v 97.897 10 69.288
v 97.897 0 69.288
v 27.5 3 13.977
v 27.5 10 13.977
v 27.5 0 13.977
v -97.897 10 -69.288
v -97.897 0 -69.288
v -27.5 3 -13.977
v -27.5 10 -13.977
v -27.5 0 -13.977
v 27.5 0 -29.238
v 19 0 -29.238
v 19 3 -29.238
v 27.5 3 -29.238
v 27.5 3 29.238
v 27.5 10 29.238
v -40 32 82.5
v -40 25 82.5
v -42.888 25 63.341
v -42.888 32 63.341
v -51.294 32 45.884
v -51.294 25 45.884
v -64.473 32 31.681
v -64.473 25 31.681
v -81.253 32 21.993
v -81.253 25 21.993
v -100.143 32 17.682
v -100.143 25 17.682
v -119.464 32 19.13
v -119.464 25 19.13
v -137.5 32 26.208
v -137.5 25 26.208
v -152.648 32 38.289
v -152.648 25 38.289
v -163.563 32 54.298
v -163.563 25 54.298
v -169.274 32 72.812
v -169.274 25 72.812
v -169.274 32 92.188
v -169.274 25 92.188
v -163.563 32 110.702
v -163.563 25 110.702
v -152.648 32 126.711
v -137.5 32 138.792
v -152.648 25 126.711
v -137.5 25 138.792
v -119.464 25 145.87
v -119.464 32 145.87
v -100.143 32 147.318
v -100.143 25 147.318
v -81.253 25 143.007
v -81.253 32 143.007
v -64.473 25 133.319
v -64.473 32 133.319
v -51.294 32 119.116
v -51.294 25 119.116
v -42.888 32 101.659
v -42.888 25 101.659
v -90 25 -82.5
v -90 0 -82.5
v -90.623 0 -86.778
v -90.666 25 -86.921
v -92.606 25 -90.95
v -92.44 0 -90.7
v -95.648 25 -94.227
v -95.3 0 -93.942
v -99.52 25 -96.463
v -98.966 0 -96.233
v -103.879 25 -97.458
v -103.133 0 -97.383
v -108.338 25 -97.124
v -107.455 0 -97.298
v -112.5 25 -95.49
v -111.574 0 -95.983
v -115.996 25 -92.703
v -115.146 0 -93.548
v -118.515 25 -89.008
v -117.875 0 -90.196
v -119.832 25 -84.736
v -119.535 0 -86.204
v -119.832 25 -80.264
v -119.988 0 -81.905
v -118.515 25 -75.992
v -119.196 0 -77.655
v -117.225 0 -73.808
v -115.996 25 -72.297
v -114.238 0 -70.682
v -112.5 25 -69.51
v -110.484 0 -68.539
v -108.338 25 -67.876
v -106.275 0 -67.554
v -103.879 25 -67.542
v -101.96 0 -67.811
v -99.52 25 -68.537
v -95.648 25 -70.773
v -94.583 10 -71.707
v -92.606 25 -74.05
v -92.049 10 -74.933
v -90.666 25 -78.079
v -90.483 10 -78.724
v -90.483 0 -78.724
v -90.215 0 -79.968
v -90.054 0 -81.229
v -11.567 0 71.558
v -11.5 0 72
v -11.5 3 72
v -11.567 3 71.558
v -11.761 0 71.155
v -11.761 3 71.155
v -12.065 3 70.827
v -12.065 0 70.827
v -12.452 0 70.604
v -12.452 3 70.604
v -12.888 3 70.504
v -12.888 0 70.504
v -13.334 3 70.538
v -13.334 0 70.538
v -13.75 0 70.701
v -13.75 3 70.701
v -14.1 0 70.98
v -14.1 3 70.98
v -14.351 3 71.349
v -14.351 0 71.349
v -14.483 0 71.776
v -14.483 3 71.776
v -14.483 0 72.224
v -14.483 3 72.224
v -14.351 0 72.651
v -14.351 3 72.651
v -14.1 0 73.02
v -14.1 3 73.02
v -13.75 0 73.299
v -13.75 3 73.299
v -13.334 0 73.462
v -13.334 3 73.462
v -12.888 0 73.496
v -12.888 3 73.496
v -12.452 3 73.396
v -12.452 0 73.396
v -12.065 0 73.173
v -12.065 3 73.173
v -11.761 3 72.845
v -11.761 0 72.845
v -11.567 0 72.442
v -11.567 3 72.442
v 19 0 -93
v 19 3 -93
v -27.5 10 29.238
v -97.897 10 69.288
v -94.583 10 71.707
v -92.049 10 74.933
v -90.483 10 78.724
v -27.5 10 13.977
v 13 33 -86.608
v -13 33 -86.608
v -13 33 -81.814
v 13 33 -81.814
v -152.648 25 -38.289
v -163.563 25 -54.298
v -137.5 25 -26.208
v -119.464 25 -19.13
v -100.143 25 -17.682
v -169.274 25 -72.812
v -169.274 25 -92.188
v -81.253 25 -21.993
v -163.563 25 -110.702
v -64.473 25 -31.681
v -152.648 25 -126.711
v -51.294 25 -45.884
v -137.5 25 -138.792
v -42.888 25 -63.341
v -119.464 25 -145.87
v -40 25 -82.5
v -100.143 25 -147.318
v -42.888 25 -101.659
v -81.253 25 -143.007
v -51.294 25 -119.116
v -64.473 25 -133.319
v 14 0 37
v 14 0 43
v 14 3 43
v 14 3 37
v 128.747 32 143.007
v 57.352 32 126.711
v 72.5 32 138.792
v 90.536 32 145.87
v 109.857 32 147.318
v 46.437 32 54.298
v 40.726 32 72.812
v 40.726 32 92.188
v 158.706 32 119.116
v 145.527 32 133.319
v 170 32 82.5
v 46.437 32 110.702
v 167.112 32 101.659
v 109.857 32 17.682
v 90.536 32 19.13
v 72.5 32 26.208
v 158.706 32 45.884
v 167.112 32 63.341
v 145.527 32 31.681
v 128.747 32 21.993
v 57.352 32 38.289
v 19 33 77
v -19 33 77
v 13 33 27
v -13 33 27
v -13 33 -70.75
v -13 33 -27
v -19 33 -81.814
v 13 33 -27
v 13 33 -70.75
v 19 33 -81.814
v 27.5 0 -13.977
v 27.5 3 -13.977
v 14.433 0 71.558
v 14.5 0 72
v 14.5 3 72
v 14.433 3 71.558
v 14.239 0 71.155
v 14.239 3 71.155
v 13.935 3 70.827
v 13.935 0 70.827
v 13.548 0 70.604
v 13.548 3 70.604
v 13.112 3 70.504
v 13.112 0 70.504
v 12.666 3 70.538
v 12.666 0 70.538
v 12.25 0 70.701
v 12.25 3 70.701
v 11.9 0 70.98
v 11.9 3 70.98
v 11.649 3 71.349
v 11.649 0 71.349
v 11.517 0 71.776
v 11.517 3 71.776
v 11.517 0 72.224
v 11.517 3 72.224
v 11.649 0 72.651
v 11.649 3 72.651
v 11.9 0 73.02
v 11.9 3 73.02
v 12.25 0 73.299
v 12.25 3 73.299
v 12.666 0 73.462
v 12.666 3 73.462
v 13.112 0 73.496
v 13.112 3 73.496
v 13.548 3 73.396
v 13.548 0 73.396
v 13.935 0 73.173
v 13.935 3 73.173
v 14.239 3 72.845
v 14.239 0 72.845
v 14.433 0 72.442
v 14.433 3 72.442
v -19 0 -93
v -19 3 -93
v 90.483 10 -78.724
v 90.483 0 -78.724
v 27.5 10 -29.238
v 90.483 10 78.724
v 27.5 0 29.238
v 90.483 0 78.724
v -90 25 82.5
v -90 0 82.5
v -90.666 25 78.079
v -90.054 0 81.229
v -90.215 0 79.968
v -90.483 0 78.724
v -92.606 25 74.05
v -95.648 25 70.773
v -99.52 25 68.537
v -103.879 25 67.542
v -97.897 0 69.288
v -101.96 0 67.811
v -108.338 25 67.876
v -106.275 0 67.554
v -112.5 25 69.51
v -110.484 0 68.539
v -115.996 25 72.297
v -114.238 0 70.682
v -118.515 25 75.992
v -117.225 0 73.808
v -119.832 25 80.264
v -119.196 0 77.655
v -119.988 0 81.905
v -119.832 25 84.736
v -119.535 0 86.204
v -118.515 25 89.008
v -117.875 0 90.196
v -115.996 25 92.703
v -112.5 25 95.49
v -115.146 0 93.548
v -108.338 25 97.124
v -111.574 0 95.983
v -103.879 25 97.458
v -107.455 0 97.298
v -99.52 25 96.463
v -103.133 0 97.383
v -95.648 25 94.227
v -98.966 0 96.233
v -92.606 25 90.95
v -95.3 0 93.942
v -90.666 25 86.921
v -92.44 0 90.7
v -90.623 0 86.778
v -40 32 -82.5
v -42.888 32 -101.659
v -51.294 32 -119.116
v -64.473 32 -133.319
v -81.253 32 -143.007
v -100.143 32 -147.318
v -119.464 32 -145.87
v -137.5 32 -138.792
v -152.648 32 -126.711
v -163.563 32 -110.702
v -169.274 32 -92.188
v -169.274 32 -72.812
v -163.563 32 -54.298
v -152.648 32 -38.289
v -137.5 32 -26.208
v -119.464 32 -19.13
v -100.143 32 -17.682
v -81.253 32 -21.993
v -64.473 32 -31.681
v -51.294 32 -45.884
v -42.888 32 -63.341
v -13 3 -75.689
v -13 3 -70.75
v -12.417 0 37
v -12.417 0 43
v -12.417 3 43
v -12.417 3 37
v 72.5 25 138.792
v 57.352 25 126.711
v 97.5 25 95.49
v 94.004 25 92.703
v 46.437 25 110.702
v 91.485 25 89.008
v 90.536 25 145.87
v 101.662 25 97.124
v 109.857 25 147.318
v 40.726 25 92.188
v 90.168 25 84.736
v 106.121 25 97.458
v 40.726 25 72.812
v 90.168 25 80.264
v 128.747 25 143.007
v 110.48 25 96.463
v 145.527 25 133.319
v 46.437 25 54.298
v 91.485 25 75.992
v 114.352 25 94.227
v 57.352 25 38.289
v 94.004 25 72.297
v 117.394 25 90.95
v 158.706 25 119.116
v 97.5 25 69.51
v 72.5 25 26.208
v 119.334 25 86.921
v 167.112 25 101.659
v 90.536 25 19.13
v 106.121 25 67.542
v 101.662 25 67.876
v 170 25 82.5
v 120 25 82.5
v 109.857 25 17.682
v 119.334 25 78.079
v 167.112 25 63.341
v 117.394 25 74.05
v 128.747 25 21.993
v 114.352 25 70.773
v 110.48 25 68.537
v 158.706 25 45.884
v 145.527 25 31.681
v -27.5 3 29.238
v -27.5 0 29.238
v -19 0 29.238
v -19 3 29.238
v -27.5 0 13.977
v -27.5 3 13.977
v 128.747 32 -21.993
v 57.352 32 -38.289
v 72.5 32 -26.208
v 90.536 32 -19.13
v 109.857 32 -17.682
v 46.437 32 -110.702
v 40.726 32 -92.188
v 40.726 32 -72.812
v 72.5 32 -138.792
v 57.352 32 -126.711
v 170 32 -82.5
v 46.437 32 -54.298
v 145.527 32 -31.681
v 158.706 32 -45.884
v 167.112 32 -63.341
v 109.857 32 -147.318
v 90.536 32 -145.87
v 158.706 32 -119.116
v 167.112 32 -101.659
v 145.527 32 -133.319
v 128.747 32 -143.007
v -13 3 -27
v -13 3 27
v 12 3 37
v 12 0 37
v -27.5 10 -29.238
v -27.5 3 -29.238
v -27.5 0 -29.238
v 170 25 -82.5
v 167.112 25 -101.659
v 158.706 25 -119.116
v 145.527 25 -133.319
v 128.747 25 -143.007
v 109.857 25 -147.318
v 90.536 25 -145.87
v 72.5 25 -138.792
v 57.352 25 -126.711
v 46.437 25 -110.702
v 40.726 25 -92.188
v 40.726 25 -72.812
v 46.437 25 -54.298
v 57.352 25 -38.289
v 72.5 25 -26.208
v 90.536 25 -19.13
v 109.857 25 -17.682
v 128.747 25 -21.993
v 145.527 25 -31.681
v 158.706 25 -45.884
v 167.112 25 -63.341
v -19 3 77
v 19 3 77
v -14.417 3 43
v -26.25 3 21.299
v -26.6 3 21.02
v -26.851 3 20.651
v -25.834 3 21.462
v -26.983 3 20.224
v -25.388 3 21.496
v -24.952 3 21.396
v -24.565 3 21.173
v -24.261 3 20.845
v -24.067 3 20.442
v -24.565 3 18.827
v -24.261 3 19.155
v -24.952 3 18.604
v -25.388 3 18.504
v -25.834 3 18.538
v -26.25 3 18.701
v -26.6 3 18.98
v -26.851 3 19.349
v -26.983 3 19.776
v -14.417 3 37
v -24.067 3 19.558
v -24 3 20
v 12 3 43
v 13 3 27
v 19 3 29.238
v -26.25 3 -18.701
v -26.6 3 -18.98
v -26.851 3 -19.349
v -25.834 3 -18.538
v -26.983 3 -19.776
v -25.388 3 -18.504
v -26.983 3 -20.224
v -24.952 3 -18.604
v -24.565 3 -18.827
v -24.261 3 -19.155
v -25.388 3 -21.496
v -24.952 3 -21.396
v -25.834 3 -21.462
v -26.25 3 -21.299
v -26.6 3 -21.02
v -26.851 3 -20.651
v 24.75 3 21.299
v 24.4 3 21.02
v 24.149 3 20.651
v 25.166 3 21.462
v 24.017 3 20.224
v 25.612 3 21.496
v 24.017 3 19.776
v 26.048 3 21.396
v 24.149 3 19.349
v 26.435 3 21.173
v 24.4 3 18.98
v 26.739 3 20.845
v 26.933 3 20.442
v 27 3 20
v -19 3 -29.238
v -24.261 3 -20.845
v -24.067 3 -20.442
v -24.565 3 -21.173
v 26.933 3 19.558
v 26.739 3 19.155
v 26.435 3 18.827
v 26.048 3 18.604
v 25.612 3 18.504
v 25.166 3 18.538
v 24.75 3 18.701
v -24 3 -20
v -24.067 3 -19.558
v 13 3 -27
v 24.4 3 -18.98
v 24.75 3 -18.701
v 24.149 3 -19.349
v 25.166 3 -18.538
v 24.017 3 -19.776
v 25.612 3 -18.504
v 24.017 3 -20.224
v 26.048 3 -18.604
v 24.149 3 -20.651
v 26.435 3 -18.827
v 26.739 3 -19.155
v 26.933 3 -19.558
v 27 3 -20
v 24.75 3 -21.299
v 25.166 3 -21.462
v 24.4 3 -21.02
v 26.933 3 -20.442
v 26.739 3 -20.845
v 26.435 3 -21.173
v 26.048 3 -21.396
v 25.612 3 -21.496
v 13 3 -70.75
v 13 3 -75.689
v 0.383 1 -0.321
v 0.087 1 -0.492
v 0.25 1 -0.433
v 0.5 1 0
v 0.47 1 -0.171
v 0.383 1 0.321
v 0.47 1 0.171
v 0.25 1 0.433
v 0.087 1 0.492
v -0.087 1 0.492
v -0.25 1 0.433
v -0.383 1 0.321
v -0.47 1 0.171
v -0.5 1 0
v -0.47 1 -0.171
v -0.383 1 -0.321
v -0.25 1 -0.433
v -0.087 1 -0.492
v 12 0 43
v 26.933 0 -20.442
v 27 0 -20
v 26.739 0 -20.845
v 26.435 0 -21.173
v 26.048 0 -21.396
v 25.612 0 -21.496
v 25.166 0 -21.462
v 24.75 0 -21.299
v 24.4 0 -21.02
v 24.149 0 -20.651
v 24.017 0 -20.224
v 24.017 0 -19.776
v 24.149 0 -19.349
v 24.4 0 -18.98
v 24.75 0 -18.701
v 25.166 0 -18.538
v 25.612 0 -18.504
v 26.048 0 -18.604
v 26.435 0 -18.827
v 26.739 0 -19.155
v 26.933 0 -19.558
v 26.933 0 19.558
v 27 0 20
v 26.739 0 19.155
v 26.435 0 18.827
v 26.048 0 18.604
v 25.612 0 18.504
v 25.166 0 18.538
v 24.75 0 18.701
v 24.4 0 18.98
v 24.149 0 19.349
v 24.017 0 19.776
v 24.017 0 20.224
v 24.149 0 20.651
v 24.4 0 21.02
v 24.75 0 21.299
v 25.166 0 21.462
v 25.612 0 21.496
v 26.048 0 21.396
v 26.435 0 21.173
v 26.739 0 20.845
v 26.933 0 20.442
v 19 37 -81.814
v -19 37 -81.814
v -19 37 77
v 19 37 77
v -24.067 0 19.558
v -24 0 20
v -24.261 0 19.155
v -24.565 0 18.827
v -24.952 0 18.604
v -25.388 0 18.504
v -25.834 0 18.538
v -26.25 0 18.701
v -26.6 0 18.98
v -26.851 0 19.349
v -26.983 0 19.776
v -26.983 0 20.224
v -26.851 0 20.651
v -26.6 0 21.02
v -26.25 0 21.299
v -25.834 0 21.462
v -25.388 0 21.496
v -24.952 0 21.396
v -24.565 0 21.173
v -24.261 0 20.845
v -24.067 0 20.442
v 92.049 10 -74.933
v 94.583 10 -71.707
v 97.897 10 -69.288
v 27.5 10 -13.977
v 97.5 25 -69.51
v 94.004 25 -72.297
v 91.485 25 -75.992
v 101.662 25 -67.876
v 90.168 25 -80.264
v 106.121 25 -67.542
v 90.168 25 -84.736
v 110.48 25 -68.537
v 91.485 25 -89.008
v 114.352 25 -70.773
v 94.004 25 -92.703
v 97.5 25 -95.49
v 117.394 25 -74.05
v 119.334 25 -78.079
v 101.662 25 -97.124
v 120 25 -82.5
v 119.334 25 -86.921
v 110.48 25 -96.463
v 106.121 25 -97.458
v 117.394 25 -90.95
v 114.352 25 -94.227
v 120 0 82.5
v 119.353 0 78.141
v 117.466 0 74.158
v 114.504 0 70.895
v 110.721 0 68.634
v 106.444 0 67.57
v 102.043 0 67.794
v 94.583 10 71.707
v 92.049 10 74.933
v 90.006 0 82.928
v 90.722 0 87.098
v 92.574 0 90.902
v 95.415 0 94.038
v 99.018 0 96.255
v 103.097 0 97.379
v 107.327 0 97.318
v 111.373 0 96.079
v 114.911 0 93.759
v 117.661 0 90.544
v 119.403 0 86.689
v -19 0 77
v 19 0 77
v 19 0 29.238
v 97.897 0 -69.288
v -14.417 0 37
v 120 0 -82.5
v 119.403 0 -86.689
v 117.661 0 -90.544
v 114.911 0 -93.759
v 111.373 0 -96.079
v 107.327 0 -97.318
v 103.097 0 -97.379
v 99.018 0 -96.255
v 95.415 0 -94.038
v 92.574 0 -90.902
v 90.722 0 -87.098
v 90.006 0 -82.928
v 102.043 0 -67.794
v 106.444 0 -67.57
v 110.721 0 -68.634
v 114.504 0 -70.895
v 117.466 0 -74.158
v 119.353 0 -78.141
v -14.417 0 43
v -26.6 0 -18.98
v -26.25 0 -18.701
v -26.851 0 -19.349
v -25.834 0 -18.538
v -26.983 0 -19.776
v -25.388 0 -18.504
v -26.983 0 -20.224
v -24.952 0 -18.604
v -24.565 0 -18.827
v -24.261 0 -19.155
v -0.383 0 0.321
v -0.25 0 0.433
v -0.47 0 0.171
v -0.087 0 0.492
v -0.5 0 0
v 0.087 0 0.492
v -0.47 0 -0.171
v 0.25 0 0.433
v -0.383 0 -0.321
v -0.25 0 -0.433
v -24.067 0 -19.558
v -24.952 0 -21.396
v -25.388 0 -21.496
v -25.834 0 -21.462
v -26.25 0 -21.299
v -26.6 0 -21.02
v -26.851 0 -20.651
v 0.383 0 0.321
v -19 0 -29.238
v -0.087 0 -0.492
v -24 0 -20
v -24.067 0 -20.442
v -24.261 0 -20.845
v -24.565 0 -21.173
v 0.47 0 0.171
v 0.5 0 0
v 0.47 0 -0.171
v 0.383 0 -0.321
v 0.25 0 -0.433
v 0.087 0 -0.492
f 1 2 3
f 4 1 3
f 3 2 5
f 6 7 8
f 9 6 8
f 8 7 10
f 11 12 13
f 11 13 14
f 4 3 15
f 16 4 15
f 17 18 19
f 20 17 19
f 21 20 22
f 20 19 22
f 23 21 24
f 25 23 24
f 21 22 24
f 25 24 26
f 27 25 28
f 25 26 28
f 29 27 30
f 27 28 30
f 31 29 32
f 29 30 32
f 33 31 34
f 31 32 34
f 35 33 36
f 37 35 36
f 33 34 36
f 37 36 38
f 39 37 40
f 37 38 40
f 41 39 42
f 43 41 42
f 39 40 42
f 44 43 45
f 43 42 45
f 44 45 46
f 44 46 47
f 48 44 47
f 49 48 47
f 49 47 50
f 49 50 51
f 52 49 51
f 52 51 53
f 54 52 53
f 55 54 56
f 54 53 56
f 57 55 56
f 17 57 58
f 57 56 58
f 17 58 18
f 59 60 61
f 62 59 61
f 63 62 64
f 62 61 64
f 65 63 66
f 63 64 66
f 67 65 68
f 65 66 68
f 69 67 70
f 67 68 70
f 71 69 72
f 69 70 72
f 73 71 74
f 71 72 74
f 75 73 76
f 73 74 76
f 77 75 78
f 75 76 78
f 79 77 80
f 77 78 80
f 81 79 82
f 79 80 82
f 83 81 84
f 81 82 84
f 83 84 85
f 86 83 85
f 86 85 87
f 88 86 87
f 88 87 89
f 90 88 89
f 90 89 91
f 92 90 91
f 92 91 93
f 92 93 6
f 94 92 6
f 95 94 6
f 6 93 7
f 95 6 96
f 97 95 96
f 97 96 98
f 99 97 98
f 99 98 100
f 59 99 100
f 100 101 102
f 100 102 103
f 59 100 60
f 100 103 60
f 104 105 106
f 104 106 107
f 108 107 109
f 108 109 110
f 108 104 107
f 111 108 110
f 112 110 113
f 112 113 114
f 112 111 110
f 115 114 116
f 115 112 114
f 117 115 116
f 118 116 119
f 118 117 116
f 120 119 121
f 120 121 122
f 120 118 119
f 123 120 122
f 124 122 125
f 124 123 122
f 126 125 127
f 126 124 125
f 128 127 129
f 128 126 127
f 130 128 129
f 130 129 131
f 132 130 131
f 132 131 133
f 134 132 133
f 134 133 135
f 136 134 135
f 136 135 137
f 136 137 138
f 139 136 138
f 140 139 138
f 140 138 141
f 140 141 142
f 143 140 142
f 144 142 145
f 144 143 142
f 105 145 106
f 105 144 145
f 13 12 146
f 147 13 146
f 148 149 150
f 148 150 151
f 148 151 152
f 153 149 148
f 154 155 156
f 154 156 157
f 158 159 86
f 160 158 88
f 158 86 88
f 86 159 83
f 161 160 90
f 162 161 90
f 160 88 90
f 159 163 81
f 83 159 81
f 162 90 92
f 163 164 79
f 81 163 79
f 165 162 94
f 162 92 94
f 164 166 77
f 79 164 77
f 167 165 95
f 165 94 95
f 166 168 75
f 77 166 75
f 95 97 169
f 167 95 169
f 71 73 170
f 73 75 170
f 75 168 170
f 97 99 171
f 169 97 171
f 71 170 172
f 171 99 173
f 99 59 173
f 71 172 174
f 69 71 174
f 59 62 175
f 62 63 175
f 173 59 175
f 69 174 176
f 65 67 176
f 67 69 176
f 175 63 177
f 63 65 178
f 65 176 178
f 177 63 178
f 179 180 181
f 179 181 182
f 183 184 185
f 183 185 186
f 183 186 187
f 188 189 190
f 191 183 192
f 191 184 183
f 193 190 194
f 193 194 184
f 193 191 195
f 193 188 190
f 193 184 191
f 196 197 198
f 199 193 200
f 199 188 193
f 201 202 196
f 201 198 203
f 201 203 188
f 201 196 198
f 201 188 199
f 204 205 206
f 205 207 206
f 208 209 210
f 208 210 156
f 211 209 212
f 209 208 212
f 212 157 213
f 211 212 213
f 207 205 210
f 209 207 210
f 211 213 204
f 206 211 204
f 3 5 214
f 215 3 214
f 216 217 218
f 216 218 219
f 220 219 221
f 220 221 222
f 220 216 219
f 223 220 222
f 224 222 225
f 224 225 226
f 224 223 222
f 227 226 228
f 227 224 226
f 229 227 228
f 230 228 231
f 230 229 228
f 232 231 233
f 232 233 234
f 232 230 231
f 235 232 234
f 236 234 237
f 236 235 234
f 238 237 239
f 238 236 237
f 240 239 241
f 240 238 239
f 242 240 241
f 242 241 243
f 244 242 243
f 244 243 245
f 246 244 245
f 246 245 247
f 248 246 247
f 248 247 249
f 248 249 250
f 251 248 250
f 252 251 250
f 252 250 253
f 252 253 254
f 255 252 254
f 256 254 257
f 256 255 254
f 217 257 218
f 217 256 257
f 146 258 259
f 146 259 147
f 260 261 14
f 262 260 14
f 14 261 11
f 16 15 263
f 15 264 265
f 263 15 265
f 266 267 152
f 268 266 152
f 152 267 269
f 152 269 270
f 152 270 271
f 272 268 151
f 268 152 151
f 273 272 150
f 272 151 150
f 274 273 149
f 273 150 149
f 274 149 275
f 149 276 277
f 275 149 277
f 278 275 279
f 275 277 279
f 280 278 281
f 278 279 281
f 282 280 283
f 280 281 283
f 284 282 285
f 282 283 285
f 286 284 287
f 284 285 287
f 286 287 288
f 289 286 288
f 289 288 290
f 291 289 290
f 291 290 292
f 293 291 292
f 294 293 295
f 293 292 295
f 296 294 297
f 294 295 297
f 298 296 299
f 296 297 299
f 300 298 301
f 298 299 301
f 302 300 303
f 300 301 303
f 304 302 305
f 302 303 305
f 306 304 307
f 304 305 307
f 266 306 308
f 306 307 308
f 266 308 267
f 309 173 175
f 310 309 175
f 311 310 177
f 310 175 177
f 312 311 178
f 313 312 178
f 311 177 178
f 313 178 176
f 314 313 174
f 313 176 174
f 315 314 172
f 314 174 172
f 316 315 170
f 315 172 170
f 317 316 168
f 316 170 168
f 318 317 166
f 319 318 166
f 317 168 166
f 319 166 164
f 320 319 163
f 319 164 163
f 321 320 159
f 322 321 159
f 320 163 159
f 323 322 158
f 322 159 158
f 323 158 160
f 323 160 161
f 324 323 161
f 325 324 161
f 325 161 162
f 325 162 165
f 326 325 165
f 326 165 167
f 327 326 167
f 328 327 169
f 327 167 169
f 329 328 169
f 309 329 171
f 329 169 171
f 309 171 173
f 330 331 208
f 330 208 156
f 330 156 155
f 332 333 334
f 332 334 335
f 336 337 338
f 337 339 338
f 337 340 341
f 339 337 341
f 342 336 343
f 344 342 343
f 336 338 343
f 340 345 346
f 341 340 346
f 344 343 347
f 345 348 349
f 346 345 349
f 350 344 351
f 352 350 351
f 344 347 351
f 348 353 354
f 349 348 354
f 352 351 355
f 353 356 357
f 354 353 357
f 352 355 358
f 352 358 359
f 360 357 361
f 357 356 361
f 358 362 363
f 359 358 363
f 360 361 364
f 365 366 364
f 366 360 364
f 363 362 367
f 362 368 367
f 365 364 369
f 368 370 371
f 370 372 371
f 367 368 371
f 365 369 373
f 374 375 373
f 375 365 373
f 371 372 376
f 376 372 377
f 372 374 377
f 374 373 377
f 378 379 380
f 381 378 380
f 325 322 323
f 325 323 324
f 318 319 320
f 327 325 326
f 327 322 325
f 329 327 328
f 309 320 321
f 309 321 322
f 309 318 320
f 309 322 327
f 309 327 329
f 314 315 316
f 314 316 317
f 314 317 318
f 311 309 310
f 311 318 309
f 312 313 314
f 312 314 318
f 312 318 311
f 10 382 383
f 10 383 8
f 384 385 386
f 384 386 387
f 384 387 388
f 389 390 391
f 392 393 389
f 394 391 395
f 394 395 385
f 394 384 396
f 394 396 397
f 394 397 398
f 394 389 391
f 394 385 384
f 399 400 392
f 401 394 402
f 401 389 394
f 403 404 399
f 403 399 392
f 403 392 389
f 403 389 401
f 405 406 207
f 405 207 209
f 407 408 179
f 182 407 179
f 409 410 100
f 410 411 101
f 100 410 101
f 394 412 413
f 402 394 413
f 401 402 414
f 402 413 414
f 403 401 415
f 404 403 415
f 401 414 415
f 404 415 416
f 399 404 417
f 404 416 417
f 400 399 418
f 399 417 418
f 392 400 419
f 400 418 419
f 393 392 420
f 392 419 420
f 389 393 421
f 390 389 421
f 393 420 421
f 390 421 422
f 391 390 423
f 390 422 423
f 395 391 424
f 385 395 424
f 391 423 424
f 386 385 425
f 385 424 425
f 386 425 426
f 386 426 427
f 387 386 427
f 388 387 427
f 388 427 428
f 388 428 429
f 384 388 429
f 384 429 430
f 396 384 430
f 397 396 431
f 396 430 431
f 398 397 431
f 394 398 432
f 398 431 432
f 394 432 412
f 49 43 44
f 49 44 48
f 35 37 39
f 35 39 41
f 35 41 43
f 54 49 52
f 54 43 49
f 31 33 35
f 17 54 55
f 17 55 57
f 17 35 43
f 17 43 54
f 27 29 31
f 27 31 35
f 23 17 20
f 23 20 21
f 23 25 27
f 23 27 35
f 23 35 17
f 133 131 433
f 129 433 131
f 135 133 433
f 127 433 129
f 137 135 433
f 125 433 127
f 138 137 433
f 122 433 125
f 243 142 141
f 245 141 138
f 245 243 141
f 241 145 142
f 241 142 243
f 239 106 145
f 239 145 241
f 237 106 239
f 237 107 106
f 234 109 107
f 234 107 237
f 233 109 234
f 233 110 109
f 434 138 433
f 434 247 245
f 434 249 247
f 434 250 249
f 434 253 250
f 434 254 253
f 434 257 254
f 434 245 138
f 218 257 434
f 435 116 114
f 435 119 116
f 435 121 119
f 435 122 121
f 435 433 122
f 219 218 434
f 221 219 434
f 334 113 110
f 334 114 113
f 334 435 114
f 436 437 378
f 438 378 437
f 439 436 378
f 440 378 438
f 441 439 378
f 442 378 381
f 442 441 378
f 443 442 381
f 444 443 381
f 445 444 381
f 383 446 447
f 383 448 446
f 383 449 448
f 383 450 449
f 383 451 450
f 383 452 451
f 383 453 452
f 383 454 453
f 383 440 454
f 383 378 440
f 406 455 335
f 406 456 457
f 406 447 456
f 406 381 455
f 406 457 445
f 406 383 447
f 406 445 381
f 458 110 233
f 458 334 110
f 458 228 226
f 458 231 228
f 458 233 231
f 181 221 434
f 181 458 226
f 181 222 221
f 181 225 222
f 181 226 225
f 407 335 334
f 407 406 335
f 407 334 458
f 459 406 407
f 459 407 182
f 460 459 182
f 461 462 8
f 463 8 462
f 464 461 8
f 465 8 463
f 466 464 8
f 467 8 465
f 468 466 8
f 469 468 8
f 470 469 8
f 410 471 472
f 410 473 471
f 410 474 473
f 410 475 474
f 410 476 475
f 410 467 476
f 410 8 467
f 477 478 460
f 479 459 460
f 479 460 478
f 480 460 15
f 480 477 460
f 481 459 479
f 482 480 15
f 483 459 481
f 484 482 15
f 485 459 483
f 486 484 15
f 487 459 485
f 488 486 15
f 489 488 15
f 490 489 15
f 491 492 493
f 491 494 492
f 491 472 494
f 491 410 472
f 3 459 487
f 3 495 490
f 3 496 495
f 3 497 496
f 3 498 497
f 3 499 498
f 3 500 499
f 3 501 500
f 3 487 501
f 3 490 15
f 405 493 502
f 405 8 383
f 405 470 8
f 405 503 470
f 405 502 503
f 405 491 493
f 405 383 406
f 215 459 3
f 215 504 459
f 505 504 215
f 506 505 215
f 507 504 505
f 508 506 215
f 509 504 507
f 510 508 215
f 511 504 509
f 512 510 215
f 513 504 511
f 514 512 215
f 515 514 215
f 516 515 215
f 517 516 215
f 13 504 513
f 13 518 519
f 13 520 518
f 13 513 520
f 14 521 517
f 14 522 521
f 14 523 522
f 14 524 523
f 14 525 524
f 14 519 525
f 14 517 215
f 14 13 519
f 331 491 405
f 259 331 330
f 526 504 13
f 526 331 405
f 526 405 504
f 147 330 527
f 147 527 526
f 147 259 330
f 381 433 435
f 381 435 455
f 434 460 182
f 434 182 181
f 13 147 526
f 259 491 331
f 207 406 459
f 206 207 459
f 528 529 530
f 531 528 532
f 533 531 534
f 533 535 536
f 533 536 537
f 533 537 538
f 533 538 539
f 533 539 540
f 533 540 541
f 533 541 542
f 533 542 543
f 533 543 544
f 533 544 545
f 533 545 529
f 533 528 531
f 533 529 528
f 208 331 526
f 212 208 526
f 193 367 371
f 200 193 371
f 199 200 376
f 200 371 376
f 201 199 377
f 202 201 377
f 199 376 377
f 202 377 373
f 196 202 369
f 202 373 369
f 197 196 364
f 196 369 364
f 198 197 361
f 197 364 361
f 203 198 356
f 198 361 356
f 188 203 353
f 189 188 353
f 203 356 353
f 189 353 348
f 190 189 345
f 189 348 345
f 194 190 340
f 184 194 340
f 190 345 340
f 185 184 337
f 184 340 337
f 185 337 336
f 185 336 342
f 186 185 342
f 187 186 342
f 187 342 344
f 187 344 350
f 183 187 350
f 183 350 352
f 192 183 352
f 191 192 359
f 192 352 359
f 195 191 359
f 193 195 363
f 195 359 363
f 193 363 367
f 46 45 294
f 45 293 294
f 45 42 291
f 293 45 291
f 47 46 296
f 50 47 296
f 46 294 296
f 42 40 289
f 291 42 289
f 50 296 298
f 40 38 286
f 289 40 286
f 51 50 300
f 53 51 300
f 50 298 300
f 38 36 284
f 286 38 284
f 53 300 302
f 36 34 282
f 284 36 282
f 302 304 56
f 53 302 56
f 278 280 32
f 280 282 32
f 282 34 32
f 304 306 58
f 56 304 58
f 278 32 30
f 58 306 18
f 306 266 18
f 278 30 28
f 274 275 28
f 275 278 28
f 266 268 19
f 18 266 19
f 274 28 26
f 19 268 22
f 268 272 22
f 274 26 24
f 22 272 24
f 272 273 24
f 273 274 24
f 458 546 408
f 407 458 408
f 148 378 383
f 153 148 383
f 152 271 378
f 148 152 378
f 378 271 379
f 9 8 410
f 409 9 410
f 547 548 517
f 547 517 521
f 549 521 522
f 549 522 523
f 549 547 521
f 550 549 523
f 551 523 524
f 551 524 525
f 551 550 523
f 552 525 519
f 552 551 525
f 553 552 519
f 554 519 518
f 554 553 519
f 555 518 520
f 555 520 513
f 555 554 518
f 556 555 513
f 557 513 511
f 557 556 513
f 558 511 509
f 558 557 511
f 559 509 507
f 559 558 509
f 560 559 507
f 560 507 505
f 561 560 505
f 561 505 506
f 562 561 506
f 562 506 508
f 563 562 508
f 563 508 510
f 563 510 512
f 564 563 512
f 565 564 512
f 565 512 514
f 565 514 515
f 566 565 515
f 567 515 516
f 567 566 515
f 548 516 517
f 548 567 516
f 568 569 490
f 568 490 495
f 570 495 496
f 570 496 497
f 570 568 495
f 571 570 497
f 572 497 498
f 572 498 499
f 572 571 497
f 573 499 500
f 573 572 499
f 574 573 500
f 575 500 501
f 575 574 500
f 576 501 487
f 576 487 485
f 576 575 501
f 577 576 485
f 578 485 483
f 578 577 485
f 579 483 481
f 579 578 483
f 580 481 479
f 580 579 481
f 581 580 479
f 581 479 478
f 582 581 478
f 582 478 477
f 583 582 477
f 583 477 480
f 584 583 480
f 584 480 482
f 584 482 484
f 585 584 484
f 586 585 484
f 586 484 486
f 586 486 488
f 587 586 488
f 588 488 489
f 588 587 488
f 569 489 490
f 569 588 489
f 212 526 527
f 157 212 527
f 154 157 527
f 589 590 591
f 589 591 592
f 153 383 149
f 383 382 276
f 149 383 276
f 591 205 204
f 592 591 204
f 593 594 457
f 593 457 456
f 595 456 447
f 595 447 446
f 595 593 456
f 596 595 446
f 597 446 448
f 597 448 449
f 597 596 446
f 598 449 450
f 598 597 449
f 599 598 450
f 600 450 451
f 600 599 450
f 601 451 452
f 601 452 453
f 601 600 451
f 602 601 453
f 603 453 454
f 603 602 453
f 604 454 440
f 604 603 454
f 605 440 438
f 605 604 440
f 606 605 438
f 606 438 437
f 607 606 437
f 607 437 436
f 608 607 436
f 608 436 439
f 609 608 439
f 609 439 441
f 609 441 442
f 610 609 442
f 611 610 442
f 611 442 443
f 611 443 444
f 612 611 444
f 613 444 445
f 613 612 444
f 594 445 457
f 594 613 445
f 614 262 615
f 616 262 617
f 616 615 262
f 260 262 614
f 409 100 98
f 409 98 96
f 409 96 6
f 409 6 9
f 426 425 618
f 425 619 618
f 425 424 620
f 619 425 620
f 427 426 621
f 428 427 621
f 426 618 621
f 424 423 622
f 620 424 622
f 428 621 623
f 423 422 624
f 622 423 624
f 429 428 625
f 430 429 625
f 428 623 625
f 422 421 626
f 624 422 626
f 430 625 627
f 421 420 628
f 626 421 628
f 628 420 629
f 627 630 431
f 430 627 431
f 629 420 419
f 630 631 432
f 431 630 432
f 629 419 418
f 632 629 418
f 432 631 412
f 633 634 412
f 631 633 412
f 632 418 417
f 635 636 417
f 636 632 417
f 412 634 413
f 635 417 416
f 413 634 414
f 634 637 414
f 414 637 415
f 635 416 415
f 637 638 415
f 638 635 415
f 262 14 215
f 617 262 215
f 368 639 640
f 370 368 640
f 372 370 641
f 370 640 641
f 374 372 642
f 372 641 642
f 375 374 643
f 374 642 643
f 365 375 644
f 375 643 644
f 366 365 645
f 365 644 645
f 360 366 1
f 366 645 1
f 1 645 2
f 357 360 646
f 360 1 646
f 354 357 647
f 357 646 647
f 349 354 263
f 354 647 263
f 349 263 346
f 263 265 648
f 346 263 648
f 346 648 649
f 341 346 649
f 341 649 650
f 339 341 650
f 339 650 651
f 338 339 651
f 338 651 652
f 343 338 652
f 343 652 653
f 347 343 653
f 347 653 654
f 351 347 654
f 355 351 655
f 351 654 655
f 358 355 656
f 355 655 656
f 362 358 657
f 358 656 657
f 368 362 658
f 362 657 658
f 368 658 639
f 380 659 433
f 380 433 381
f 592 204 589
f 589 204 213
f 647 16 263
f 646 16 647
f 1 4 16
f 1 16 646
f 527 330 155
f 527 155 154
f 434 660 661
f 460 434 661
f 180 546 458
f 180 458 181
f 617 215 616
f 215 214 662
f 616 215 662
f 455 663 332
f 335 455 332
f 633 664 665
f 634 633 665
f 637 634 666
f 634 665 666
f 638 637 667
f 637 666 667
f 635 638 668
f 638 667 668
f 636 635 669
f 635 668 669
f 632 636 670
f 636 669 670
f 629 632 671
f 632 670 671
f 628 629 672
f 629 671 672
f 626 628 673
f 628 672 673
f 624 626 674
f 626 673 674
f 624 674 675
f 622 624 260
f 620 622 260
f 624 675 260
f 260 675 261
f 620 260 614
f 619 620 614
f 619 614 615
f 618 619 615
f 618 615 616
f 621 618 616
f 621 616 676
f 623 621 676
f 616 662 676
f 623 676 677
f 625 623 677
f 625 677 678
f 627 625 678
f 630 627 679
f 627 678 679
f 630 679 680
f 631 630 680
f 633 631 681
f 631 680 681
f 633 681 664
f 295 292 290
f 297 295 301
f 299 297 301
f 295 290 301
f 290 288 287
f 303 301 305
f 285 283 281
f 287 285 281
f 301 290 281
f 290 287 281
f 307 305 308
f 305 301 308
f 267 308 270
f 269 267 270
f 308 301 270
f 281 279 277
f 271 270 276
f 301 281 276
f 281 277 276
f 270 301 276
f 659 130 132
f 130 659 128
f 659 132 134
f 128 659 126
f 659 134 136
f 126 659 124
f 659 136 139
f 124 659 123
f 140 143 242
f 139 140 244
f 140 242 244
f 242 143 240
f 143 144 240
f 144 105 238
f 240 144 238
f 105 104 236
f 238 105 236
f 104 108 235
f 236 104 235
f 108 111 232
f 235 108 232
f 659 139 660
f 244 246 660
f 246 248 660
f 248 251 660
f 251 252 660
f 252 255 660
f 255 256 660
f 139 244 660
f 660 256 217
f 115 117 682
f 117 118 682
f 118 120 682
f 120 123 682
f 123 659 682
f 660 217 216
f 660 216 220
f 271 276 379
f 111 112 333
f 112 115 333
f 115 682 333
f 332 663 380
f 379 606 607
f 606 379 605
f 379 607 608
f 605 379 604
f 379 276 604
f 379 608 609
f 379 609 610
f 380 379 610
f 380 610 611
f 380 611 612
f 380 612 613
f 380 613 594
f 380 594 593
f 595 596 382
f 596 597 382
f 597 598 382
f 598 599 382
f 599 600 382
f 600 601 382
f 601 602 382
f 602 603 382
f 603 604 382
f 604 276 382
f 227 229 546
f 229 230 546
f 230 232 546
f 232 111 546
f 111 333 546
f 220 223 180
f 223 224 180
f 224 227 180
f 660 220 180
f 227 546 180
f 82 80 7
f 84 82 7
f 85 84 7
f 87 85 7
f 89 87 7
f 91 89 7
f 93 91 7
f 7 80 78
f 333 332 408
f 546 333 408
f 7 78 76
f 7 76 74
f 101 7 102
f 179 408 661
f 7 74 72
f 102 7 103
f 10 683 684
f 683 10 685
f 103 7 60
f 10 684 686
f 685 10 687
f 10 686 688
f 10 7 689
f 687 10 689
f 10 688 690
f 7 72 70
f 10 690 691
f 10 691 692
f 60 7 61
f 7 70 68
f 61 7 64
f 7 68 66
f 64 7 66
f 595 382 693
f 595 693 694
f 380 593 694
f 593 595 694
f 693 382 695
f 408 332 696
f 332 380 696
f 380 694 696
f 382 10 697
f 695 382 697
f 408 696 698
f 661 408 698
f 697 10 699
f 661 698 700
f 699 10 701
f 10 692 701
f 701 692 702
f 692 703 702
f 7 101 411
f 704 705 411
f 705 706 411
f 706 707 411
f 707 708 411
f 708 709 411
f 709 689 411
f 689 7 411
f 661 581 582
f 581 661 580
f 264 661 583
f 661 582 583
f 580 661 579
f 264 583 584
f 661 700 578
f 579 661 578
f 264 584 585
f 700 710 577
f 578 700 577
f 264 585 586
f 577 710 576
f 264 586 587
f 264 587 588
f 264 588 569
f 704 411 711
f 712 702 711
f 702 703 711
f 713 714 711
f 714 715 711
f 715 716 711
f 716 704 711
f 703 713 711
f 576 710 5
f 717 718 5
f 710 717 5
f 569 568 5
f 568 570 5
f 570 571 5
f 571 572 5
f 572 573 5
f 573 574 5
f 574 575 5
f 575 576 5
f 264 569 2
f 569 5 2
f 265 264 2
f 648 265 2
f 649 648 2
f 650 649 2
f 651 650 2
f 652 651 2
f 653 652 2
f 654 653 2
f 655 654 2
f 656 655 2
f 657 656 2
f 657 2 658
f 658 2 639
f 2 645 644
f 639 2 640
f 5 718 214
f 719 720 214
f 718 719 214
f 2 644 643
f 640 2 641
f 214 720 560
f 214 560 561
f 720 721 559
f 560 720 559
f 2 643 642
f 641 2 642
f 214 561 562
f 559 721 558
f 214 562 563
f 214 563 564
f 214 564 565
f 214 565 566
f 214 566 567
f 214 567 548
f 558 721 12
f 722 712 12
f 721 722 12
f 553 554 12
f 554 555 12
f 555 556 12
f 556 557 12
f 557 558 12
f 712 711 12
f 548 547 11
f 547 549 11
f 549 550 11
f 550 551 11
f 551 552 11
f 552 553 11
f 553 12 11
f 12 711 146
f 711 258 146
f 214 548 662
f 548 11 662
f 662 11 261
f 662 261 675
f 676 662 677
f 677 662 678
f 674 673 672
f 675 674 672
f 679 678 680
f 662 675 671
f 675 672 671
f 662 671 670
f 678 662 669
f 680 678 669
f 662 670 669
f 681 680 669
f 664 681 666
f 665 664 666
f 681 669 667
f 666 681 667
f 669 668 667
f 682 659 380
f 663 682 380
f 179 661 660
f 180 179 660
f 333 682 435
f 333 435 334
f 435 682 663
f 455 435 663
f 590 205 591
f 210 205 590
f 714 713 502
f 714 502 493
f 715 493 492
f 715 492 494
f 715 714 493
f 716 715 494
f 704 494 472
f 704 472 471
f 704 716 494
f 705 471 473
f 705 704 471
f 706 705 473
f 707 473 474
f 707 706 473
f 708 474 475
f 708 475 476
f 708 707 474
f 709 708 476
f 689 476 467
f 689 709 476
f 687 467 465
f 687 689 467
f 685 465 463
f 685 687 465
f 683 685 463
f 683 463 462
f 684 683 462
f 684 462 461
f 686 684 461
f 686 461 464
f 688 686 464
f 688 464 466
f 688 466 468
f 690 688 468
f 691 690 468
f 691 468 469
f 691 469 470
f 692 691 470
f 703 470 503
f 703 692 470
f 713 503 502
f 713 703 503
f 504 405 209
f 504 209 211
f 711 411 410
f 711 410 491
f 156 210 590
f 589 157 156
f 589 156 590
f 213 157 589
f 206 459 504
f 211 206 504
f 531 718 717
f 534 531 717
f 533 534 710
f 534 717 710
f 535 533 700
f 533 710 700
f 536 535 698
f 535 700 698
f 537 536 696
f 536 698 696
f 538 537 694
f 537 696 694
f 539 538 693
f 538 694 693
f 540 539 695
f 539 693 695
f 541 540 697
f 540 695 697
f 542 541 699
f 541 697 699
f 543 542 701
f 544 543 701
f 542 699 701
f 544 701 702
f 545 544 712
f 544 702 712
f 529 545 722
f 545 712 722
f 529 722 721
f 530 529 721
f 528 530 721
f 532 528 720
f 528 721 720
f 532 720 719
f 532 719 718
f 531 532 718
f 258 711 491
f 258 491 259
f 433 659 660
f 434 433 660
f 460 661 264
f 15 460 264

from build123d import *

# Parameters (mm, degrees)
SKETCH2_W           = 38
SKETCH2_H           = 170
SKETCH2_R           = 1.5
SKETCH2_W_2         = 2
SKETCH2_H_2         = 6
SKETCH2_W_3         = 55
SKETCH2_H_3         = 58.475280412
BOSS_EXTRUDE2_DEPTH = 3
BOSS_EXTRUDE3_DEPTH = 10
SKETCH2_4_R         = 15
BOSS_EXTRUDE4_DEPTH = 25
SKETCH3_R           = 65
BOSS_EXTRUDE5_DEPTH = 7
SKETCH4_W           = 26
SKETCH4_H           = 54
SKETCH4_H_2         = 15.857774488
BOSS_EXTRUDE6_DEPTH = 30
SKETCH5_W           = 38
SKETCH5_H           = 158.814442682
BOSS_EXTRUDE7_DEPTH = 4
DRAFT1_ANGLE        = -20
SKETCH6_R           = 0.5
CUT_EXTRUDE1_DEPTH  = 1


with BuildPart() as part:
    # Sketch2 → Boss-Extrude2 (new body)
    with BuildSketch(Plane(origin=(0, 0, 0), x_dir=(1, 0, 0), z_dir=(0, 1, 0))):
        with Locations((0, 8)):
            Rectangle(SKETCH2_W, SKETCH2_H)
        with Locations((-13, -72)):
            Circle(SKETCH2_R, mode=Mode.SUBTRACT)
        with Locations((13, -72)):
            Circle(SKETCH2_R, mode=Mode.SUBTRACT)
        with Locations((13, -40)):
            Rectangle(SKETCH2_W_2, SKETCH2_H_2, mode=Mode.SUBTRACT)
        with Locations((-13.416960254, -40)):
            Rectangle(SKETCH2_W_2, SKETCH2_H_2, mode=Mode.SUBTRACT)
        Rectangle(SKETCH2_W_3, SKETCH2_H_3)
        with Locations((-25.5, 20)):
            Circle(SKETCH2_R, mode=Mode.SUBTRACT)
        with Locations((25.5, 20)):
            Circle(SKETCH2_R, mode=Mode.SUBTRACT)
        with Locations((25.5, -20)):
            Circle(SKETCH2_R, mode=Mode.SUBTRACT)
        with Locations((-25.5, -20)):
            Circle(SKETCH2_R, mode=Mode.SUBTRACT)
    extrude(amount=BOSS_EXTRUDE2_DEPTH)

    # Sketch2<3> → Boss-Extrude3 (add)
    with BuildSketch(Plane(origin=(0, 0, 0), x_dir=(1, 0, 0), z_dir=(0, 1, 0))):
        with BuildLine():
            ThreePointArc((-90.482980764, 78.72426795), (-93.205224918, 73.232676721), (-97.896839388, 69.288447884))
            Line((-97.896839388, 69.288447884), (-27.5, 13.976645508))
            Line((-27.5, 13.976645508), (-27.5, 29.237640206))
            Line((-27.5, 29.237640206), (-90.482980764, 78.72426795))
        make_face()
        with BuildLine():
            Line((-27.5, -13.976645508), (-97.896839388, -69.288447884))
            ThreePointArc((-97.896839388, -69.288447884), (-93.205224918, -73.232676721), (-90.482980764, -78.72426795))
            Line((-90.482980764, -78.72426795), (-27.5, -29.237640206))
            Line((-27.5, -29.237640206), (-27.5, -13.976645508))
        make_face()
        with BuildLine():
            Line((90.482980764, 78.72426795), (27.5, 29.237640206))
            Line((27.5, 29.237640206), (27.5, 13.976645508))
            Line((27.5, 13.976645508), (97.896839388, 69.288447884))
            ThreePointArc((97.896839388, 69.288447884), (93.205224918, 73.232676721), (90.482980764, 78.72426795))
        make_face()
        with BuildLine():
            Line((27.5, -29.237640206), (90.482980764, -78.72426795))
            ThreePointArc((90.482980764, -78.72426795), (93.205224918, -73.232676721), (97.896839388, -69.288447884))
            Line((97.896839388, -69.288447884), (27.5, -13.976645508))
            Line((27.5, -13.976645508), (27.5, -29.237640206))
        make_face()
    extrude(amount=BOSS_EXTRUDE3_DEPTH)

    # Sketch2<4> → Boss-Extrude4 (add)
    with BuildSketch(Plane(origin=(0, 0, 0), x_dir=(1, 0, 0), z_dir=(0, 1, 0))):
        with Locations((-105, 82.5)):
            Circle(SKETCH2_4_R)
        with Locations((105, 82.5)):
            Circle(SKETCH2_4_R)
        with Locations((105, -82.5)):
            Circle(SKETCH2_4_R)
        with Locations((-105, -82.5)):
            Circle(SKETCH2_4_R)
    extrude(amount=BOSS_EXTRUDE4_DEPTH)

    # Sketch3 → Boss-Extrude5 (add)
    with BuildSketch(Plane(origin=(0, 25, 0), x_dir=(1, 0, 0), z_dir=(0, 1, 0))):
        with Locations((-105, -82.5)):
            Circle(SKETCH3_R)
        with Locations((105, -82.5)):
            Circle(SKETCH3_R)
        with Locations((105, 82.5)):
            Circle(SKETCH3_R)
        with Locations((-105, 82.5)):
            Circle(SKETCH3_R)
    extrude(amount=BOSS_EXTRUDE5_DEPTH)

    # Sketch4 → Boss-Extrude6 (add)
    with BuildSketch(Plane(origin=(0, 3, 0), x_dir=(1, 0, 0), z_dir=(0, 1, 0))):
        Rectangle(SKETCH4_W, SKETCH4_H)
        with Locations((0, 78.679384084)):
            Rectangle(SKETCH4_W, SKETCH4_H_2)
    extrude(amount=BOSS_EXTRUDE6_DEPTH)

    # Sketch5 → Boss-Extrude7 (add)
    with BuildSketch(Plane(origin=(0, 33, 0), x_dir=(1, 0, 0), z_dir=(0, 1, 0))):
        with Locations((0, 2.407221341)):
            Rectangle(SKETCH5_W, SKETCH5_H)
    extrude(amount=BOSS_EXTRUDE7_DEPTH)

    # Draft1
    draft1_faces = [part.faces().sort_by_distance(p)[0] for p in [
        (0, 18, -86.608271328),
    ]]
    draft(draft1_faces, Plane.ZX.offset(33), DRAFT1_ANGLE)

    # Sketch6 → Cut-Extrude1 (cut)
    with BuildSketch(Plane.XZ):
        Circle(SKETCH6_R)
    extrude(amount=-CUT_EXTRUDE1_DEPTH, mode=Mode.SUBTRACT)


solid = part.part
